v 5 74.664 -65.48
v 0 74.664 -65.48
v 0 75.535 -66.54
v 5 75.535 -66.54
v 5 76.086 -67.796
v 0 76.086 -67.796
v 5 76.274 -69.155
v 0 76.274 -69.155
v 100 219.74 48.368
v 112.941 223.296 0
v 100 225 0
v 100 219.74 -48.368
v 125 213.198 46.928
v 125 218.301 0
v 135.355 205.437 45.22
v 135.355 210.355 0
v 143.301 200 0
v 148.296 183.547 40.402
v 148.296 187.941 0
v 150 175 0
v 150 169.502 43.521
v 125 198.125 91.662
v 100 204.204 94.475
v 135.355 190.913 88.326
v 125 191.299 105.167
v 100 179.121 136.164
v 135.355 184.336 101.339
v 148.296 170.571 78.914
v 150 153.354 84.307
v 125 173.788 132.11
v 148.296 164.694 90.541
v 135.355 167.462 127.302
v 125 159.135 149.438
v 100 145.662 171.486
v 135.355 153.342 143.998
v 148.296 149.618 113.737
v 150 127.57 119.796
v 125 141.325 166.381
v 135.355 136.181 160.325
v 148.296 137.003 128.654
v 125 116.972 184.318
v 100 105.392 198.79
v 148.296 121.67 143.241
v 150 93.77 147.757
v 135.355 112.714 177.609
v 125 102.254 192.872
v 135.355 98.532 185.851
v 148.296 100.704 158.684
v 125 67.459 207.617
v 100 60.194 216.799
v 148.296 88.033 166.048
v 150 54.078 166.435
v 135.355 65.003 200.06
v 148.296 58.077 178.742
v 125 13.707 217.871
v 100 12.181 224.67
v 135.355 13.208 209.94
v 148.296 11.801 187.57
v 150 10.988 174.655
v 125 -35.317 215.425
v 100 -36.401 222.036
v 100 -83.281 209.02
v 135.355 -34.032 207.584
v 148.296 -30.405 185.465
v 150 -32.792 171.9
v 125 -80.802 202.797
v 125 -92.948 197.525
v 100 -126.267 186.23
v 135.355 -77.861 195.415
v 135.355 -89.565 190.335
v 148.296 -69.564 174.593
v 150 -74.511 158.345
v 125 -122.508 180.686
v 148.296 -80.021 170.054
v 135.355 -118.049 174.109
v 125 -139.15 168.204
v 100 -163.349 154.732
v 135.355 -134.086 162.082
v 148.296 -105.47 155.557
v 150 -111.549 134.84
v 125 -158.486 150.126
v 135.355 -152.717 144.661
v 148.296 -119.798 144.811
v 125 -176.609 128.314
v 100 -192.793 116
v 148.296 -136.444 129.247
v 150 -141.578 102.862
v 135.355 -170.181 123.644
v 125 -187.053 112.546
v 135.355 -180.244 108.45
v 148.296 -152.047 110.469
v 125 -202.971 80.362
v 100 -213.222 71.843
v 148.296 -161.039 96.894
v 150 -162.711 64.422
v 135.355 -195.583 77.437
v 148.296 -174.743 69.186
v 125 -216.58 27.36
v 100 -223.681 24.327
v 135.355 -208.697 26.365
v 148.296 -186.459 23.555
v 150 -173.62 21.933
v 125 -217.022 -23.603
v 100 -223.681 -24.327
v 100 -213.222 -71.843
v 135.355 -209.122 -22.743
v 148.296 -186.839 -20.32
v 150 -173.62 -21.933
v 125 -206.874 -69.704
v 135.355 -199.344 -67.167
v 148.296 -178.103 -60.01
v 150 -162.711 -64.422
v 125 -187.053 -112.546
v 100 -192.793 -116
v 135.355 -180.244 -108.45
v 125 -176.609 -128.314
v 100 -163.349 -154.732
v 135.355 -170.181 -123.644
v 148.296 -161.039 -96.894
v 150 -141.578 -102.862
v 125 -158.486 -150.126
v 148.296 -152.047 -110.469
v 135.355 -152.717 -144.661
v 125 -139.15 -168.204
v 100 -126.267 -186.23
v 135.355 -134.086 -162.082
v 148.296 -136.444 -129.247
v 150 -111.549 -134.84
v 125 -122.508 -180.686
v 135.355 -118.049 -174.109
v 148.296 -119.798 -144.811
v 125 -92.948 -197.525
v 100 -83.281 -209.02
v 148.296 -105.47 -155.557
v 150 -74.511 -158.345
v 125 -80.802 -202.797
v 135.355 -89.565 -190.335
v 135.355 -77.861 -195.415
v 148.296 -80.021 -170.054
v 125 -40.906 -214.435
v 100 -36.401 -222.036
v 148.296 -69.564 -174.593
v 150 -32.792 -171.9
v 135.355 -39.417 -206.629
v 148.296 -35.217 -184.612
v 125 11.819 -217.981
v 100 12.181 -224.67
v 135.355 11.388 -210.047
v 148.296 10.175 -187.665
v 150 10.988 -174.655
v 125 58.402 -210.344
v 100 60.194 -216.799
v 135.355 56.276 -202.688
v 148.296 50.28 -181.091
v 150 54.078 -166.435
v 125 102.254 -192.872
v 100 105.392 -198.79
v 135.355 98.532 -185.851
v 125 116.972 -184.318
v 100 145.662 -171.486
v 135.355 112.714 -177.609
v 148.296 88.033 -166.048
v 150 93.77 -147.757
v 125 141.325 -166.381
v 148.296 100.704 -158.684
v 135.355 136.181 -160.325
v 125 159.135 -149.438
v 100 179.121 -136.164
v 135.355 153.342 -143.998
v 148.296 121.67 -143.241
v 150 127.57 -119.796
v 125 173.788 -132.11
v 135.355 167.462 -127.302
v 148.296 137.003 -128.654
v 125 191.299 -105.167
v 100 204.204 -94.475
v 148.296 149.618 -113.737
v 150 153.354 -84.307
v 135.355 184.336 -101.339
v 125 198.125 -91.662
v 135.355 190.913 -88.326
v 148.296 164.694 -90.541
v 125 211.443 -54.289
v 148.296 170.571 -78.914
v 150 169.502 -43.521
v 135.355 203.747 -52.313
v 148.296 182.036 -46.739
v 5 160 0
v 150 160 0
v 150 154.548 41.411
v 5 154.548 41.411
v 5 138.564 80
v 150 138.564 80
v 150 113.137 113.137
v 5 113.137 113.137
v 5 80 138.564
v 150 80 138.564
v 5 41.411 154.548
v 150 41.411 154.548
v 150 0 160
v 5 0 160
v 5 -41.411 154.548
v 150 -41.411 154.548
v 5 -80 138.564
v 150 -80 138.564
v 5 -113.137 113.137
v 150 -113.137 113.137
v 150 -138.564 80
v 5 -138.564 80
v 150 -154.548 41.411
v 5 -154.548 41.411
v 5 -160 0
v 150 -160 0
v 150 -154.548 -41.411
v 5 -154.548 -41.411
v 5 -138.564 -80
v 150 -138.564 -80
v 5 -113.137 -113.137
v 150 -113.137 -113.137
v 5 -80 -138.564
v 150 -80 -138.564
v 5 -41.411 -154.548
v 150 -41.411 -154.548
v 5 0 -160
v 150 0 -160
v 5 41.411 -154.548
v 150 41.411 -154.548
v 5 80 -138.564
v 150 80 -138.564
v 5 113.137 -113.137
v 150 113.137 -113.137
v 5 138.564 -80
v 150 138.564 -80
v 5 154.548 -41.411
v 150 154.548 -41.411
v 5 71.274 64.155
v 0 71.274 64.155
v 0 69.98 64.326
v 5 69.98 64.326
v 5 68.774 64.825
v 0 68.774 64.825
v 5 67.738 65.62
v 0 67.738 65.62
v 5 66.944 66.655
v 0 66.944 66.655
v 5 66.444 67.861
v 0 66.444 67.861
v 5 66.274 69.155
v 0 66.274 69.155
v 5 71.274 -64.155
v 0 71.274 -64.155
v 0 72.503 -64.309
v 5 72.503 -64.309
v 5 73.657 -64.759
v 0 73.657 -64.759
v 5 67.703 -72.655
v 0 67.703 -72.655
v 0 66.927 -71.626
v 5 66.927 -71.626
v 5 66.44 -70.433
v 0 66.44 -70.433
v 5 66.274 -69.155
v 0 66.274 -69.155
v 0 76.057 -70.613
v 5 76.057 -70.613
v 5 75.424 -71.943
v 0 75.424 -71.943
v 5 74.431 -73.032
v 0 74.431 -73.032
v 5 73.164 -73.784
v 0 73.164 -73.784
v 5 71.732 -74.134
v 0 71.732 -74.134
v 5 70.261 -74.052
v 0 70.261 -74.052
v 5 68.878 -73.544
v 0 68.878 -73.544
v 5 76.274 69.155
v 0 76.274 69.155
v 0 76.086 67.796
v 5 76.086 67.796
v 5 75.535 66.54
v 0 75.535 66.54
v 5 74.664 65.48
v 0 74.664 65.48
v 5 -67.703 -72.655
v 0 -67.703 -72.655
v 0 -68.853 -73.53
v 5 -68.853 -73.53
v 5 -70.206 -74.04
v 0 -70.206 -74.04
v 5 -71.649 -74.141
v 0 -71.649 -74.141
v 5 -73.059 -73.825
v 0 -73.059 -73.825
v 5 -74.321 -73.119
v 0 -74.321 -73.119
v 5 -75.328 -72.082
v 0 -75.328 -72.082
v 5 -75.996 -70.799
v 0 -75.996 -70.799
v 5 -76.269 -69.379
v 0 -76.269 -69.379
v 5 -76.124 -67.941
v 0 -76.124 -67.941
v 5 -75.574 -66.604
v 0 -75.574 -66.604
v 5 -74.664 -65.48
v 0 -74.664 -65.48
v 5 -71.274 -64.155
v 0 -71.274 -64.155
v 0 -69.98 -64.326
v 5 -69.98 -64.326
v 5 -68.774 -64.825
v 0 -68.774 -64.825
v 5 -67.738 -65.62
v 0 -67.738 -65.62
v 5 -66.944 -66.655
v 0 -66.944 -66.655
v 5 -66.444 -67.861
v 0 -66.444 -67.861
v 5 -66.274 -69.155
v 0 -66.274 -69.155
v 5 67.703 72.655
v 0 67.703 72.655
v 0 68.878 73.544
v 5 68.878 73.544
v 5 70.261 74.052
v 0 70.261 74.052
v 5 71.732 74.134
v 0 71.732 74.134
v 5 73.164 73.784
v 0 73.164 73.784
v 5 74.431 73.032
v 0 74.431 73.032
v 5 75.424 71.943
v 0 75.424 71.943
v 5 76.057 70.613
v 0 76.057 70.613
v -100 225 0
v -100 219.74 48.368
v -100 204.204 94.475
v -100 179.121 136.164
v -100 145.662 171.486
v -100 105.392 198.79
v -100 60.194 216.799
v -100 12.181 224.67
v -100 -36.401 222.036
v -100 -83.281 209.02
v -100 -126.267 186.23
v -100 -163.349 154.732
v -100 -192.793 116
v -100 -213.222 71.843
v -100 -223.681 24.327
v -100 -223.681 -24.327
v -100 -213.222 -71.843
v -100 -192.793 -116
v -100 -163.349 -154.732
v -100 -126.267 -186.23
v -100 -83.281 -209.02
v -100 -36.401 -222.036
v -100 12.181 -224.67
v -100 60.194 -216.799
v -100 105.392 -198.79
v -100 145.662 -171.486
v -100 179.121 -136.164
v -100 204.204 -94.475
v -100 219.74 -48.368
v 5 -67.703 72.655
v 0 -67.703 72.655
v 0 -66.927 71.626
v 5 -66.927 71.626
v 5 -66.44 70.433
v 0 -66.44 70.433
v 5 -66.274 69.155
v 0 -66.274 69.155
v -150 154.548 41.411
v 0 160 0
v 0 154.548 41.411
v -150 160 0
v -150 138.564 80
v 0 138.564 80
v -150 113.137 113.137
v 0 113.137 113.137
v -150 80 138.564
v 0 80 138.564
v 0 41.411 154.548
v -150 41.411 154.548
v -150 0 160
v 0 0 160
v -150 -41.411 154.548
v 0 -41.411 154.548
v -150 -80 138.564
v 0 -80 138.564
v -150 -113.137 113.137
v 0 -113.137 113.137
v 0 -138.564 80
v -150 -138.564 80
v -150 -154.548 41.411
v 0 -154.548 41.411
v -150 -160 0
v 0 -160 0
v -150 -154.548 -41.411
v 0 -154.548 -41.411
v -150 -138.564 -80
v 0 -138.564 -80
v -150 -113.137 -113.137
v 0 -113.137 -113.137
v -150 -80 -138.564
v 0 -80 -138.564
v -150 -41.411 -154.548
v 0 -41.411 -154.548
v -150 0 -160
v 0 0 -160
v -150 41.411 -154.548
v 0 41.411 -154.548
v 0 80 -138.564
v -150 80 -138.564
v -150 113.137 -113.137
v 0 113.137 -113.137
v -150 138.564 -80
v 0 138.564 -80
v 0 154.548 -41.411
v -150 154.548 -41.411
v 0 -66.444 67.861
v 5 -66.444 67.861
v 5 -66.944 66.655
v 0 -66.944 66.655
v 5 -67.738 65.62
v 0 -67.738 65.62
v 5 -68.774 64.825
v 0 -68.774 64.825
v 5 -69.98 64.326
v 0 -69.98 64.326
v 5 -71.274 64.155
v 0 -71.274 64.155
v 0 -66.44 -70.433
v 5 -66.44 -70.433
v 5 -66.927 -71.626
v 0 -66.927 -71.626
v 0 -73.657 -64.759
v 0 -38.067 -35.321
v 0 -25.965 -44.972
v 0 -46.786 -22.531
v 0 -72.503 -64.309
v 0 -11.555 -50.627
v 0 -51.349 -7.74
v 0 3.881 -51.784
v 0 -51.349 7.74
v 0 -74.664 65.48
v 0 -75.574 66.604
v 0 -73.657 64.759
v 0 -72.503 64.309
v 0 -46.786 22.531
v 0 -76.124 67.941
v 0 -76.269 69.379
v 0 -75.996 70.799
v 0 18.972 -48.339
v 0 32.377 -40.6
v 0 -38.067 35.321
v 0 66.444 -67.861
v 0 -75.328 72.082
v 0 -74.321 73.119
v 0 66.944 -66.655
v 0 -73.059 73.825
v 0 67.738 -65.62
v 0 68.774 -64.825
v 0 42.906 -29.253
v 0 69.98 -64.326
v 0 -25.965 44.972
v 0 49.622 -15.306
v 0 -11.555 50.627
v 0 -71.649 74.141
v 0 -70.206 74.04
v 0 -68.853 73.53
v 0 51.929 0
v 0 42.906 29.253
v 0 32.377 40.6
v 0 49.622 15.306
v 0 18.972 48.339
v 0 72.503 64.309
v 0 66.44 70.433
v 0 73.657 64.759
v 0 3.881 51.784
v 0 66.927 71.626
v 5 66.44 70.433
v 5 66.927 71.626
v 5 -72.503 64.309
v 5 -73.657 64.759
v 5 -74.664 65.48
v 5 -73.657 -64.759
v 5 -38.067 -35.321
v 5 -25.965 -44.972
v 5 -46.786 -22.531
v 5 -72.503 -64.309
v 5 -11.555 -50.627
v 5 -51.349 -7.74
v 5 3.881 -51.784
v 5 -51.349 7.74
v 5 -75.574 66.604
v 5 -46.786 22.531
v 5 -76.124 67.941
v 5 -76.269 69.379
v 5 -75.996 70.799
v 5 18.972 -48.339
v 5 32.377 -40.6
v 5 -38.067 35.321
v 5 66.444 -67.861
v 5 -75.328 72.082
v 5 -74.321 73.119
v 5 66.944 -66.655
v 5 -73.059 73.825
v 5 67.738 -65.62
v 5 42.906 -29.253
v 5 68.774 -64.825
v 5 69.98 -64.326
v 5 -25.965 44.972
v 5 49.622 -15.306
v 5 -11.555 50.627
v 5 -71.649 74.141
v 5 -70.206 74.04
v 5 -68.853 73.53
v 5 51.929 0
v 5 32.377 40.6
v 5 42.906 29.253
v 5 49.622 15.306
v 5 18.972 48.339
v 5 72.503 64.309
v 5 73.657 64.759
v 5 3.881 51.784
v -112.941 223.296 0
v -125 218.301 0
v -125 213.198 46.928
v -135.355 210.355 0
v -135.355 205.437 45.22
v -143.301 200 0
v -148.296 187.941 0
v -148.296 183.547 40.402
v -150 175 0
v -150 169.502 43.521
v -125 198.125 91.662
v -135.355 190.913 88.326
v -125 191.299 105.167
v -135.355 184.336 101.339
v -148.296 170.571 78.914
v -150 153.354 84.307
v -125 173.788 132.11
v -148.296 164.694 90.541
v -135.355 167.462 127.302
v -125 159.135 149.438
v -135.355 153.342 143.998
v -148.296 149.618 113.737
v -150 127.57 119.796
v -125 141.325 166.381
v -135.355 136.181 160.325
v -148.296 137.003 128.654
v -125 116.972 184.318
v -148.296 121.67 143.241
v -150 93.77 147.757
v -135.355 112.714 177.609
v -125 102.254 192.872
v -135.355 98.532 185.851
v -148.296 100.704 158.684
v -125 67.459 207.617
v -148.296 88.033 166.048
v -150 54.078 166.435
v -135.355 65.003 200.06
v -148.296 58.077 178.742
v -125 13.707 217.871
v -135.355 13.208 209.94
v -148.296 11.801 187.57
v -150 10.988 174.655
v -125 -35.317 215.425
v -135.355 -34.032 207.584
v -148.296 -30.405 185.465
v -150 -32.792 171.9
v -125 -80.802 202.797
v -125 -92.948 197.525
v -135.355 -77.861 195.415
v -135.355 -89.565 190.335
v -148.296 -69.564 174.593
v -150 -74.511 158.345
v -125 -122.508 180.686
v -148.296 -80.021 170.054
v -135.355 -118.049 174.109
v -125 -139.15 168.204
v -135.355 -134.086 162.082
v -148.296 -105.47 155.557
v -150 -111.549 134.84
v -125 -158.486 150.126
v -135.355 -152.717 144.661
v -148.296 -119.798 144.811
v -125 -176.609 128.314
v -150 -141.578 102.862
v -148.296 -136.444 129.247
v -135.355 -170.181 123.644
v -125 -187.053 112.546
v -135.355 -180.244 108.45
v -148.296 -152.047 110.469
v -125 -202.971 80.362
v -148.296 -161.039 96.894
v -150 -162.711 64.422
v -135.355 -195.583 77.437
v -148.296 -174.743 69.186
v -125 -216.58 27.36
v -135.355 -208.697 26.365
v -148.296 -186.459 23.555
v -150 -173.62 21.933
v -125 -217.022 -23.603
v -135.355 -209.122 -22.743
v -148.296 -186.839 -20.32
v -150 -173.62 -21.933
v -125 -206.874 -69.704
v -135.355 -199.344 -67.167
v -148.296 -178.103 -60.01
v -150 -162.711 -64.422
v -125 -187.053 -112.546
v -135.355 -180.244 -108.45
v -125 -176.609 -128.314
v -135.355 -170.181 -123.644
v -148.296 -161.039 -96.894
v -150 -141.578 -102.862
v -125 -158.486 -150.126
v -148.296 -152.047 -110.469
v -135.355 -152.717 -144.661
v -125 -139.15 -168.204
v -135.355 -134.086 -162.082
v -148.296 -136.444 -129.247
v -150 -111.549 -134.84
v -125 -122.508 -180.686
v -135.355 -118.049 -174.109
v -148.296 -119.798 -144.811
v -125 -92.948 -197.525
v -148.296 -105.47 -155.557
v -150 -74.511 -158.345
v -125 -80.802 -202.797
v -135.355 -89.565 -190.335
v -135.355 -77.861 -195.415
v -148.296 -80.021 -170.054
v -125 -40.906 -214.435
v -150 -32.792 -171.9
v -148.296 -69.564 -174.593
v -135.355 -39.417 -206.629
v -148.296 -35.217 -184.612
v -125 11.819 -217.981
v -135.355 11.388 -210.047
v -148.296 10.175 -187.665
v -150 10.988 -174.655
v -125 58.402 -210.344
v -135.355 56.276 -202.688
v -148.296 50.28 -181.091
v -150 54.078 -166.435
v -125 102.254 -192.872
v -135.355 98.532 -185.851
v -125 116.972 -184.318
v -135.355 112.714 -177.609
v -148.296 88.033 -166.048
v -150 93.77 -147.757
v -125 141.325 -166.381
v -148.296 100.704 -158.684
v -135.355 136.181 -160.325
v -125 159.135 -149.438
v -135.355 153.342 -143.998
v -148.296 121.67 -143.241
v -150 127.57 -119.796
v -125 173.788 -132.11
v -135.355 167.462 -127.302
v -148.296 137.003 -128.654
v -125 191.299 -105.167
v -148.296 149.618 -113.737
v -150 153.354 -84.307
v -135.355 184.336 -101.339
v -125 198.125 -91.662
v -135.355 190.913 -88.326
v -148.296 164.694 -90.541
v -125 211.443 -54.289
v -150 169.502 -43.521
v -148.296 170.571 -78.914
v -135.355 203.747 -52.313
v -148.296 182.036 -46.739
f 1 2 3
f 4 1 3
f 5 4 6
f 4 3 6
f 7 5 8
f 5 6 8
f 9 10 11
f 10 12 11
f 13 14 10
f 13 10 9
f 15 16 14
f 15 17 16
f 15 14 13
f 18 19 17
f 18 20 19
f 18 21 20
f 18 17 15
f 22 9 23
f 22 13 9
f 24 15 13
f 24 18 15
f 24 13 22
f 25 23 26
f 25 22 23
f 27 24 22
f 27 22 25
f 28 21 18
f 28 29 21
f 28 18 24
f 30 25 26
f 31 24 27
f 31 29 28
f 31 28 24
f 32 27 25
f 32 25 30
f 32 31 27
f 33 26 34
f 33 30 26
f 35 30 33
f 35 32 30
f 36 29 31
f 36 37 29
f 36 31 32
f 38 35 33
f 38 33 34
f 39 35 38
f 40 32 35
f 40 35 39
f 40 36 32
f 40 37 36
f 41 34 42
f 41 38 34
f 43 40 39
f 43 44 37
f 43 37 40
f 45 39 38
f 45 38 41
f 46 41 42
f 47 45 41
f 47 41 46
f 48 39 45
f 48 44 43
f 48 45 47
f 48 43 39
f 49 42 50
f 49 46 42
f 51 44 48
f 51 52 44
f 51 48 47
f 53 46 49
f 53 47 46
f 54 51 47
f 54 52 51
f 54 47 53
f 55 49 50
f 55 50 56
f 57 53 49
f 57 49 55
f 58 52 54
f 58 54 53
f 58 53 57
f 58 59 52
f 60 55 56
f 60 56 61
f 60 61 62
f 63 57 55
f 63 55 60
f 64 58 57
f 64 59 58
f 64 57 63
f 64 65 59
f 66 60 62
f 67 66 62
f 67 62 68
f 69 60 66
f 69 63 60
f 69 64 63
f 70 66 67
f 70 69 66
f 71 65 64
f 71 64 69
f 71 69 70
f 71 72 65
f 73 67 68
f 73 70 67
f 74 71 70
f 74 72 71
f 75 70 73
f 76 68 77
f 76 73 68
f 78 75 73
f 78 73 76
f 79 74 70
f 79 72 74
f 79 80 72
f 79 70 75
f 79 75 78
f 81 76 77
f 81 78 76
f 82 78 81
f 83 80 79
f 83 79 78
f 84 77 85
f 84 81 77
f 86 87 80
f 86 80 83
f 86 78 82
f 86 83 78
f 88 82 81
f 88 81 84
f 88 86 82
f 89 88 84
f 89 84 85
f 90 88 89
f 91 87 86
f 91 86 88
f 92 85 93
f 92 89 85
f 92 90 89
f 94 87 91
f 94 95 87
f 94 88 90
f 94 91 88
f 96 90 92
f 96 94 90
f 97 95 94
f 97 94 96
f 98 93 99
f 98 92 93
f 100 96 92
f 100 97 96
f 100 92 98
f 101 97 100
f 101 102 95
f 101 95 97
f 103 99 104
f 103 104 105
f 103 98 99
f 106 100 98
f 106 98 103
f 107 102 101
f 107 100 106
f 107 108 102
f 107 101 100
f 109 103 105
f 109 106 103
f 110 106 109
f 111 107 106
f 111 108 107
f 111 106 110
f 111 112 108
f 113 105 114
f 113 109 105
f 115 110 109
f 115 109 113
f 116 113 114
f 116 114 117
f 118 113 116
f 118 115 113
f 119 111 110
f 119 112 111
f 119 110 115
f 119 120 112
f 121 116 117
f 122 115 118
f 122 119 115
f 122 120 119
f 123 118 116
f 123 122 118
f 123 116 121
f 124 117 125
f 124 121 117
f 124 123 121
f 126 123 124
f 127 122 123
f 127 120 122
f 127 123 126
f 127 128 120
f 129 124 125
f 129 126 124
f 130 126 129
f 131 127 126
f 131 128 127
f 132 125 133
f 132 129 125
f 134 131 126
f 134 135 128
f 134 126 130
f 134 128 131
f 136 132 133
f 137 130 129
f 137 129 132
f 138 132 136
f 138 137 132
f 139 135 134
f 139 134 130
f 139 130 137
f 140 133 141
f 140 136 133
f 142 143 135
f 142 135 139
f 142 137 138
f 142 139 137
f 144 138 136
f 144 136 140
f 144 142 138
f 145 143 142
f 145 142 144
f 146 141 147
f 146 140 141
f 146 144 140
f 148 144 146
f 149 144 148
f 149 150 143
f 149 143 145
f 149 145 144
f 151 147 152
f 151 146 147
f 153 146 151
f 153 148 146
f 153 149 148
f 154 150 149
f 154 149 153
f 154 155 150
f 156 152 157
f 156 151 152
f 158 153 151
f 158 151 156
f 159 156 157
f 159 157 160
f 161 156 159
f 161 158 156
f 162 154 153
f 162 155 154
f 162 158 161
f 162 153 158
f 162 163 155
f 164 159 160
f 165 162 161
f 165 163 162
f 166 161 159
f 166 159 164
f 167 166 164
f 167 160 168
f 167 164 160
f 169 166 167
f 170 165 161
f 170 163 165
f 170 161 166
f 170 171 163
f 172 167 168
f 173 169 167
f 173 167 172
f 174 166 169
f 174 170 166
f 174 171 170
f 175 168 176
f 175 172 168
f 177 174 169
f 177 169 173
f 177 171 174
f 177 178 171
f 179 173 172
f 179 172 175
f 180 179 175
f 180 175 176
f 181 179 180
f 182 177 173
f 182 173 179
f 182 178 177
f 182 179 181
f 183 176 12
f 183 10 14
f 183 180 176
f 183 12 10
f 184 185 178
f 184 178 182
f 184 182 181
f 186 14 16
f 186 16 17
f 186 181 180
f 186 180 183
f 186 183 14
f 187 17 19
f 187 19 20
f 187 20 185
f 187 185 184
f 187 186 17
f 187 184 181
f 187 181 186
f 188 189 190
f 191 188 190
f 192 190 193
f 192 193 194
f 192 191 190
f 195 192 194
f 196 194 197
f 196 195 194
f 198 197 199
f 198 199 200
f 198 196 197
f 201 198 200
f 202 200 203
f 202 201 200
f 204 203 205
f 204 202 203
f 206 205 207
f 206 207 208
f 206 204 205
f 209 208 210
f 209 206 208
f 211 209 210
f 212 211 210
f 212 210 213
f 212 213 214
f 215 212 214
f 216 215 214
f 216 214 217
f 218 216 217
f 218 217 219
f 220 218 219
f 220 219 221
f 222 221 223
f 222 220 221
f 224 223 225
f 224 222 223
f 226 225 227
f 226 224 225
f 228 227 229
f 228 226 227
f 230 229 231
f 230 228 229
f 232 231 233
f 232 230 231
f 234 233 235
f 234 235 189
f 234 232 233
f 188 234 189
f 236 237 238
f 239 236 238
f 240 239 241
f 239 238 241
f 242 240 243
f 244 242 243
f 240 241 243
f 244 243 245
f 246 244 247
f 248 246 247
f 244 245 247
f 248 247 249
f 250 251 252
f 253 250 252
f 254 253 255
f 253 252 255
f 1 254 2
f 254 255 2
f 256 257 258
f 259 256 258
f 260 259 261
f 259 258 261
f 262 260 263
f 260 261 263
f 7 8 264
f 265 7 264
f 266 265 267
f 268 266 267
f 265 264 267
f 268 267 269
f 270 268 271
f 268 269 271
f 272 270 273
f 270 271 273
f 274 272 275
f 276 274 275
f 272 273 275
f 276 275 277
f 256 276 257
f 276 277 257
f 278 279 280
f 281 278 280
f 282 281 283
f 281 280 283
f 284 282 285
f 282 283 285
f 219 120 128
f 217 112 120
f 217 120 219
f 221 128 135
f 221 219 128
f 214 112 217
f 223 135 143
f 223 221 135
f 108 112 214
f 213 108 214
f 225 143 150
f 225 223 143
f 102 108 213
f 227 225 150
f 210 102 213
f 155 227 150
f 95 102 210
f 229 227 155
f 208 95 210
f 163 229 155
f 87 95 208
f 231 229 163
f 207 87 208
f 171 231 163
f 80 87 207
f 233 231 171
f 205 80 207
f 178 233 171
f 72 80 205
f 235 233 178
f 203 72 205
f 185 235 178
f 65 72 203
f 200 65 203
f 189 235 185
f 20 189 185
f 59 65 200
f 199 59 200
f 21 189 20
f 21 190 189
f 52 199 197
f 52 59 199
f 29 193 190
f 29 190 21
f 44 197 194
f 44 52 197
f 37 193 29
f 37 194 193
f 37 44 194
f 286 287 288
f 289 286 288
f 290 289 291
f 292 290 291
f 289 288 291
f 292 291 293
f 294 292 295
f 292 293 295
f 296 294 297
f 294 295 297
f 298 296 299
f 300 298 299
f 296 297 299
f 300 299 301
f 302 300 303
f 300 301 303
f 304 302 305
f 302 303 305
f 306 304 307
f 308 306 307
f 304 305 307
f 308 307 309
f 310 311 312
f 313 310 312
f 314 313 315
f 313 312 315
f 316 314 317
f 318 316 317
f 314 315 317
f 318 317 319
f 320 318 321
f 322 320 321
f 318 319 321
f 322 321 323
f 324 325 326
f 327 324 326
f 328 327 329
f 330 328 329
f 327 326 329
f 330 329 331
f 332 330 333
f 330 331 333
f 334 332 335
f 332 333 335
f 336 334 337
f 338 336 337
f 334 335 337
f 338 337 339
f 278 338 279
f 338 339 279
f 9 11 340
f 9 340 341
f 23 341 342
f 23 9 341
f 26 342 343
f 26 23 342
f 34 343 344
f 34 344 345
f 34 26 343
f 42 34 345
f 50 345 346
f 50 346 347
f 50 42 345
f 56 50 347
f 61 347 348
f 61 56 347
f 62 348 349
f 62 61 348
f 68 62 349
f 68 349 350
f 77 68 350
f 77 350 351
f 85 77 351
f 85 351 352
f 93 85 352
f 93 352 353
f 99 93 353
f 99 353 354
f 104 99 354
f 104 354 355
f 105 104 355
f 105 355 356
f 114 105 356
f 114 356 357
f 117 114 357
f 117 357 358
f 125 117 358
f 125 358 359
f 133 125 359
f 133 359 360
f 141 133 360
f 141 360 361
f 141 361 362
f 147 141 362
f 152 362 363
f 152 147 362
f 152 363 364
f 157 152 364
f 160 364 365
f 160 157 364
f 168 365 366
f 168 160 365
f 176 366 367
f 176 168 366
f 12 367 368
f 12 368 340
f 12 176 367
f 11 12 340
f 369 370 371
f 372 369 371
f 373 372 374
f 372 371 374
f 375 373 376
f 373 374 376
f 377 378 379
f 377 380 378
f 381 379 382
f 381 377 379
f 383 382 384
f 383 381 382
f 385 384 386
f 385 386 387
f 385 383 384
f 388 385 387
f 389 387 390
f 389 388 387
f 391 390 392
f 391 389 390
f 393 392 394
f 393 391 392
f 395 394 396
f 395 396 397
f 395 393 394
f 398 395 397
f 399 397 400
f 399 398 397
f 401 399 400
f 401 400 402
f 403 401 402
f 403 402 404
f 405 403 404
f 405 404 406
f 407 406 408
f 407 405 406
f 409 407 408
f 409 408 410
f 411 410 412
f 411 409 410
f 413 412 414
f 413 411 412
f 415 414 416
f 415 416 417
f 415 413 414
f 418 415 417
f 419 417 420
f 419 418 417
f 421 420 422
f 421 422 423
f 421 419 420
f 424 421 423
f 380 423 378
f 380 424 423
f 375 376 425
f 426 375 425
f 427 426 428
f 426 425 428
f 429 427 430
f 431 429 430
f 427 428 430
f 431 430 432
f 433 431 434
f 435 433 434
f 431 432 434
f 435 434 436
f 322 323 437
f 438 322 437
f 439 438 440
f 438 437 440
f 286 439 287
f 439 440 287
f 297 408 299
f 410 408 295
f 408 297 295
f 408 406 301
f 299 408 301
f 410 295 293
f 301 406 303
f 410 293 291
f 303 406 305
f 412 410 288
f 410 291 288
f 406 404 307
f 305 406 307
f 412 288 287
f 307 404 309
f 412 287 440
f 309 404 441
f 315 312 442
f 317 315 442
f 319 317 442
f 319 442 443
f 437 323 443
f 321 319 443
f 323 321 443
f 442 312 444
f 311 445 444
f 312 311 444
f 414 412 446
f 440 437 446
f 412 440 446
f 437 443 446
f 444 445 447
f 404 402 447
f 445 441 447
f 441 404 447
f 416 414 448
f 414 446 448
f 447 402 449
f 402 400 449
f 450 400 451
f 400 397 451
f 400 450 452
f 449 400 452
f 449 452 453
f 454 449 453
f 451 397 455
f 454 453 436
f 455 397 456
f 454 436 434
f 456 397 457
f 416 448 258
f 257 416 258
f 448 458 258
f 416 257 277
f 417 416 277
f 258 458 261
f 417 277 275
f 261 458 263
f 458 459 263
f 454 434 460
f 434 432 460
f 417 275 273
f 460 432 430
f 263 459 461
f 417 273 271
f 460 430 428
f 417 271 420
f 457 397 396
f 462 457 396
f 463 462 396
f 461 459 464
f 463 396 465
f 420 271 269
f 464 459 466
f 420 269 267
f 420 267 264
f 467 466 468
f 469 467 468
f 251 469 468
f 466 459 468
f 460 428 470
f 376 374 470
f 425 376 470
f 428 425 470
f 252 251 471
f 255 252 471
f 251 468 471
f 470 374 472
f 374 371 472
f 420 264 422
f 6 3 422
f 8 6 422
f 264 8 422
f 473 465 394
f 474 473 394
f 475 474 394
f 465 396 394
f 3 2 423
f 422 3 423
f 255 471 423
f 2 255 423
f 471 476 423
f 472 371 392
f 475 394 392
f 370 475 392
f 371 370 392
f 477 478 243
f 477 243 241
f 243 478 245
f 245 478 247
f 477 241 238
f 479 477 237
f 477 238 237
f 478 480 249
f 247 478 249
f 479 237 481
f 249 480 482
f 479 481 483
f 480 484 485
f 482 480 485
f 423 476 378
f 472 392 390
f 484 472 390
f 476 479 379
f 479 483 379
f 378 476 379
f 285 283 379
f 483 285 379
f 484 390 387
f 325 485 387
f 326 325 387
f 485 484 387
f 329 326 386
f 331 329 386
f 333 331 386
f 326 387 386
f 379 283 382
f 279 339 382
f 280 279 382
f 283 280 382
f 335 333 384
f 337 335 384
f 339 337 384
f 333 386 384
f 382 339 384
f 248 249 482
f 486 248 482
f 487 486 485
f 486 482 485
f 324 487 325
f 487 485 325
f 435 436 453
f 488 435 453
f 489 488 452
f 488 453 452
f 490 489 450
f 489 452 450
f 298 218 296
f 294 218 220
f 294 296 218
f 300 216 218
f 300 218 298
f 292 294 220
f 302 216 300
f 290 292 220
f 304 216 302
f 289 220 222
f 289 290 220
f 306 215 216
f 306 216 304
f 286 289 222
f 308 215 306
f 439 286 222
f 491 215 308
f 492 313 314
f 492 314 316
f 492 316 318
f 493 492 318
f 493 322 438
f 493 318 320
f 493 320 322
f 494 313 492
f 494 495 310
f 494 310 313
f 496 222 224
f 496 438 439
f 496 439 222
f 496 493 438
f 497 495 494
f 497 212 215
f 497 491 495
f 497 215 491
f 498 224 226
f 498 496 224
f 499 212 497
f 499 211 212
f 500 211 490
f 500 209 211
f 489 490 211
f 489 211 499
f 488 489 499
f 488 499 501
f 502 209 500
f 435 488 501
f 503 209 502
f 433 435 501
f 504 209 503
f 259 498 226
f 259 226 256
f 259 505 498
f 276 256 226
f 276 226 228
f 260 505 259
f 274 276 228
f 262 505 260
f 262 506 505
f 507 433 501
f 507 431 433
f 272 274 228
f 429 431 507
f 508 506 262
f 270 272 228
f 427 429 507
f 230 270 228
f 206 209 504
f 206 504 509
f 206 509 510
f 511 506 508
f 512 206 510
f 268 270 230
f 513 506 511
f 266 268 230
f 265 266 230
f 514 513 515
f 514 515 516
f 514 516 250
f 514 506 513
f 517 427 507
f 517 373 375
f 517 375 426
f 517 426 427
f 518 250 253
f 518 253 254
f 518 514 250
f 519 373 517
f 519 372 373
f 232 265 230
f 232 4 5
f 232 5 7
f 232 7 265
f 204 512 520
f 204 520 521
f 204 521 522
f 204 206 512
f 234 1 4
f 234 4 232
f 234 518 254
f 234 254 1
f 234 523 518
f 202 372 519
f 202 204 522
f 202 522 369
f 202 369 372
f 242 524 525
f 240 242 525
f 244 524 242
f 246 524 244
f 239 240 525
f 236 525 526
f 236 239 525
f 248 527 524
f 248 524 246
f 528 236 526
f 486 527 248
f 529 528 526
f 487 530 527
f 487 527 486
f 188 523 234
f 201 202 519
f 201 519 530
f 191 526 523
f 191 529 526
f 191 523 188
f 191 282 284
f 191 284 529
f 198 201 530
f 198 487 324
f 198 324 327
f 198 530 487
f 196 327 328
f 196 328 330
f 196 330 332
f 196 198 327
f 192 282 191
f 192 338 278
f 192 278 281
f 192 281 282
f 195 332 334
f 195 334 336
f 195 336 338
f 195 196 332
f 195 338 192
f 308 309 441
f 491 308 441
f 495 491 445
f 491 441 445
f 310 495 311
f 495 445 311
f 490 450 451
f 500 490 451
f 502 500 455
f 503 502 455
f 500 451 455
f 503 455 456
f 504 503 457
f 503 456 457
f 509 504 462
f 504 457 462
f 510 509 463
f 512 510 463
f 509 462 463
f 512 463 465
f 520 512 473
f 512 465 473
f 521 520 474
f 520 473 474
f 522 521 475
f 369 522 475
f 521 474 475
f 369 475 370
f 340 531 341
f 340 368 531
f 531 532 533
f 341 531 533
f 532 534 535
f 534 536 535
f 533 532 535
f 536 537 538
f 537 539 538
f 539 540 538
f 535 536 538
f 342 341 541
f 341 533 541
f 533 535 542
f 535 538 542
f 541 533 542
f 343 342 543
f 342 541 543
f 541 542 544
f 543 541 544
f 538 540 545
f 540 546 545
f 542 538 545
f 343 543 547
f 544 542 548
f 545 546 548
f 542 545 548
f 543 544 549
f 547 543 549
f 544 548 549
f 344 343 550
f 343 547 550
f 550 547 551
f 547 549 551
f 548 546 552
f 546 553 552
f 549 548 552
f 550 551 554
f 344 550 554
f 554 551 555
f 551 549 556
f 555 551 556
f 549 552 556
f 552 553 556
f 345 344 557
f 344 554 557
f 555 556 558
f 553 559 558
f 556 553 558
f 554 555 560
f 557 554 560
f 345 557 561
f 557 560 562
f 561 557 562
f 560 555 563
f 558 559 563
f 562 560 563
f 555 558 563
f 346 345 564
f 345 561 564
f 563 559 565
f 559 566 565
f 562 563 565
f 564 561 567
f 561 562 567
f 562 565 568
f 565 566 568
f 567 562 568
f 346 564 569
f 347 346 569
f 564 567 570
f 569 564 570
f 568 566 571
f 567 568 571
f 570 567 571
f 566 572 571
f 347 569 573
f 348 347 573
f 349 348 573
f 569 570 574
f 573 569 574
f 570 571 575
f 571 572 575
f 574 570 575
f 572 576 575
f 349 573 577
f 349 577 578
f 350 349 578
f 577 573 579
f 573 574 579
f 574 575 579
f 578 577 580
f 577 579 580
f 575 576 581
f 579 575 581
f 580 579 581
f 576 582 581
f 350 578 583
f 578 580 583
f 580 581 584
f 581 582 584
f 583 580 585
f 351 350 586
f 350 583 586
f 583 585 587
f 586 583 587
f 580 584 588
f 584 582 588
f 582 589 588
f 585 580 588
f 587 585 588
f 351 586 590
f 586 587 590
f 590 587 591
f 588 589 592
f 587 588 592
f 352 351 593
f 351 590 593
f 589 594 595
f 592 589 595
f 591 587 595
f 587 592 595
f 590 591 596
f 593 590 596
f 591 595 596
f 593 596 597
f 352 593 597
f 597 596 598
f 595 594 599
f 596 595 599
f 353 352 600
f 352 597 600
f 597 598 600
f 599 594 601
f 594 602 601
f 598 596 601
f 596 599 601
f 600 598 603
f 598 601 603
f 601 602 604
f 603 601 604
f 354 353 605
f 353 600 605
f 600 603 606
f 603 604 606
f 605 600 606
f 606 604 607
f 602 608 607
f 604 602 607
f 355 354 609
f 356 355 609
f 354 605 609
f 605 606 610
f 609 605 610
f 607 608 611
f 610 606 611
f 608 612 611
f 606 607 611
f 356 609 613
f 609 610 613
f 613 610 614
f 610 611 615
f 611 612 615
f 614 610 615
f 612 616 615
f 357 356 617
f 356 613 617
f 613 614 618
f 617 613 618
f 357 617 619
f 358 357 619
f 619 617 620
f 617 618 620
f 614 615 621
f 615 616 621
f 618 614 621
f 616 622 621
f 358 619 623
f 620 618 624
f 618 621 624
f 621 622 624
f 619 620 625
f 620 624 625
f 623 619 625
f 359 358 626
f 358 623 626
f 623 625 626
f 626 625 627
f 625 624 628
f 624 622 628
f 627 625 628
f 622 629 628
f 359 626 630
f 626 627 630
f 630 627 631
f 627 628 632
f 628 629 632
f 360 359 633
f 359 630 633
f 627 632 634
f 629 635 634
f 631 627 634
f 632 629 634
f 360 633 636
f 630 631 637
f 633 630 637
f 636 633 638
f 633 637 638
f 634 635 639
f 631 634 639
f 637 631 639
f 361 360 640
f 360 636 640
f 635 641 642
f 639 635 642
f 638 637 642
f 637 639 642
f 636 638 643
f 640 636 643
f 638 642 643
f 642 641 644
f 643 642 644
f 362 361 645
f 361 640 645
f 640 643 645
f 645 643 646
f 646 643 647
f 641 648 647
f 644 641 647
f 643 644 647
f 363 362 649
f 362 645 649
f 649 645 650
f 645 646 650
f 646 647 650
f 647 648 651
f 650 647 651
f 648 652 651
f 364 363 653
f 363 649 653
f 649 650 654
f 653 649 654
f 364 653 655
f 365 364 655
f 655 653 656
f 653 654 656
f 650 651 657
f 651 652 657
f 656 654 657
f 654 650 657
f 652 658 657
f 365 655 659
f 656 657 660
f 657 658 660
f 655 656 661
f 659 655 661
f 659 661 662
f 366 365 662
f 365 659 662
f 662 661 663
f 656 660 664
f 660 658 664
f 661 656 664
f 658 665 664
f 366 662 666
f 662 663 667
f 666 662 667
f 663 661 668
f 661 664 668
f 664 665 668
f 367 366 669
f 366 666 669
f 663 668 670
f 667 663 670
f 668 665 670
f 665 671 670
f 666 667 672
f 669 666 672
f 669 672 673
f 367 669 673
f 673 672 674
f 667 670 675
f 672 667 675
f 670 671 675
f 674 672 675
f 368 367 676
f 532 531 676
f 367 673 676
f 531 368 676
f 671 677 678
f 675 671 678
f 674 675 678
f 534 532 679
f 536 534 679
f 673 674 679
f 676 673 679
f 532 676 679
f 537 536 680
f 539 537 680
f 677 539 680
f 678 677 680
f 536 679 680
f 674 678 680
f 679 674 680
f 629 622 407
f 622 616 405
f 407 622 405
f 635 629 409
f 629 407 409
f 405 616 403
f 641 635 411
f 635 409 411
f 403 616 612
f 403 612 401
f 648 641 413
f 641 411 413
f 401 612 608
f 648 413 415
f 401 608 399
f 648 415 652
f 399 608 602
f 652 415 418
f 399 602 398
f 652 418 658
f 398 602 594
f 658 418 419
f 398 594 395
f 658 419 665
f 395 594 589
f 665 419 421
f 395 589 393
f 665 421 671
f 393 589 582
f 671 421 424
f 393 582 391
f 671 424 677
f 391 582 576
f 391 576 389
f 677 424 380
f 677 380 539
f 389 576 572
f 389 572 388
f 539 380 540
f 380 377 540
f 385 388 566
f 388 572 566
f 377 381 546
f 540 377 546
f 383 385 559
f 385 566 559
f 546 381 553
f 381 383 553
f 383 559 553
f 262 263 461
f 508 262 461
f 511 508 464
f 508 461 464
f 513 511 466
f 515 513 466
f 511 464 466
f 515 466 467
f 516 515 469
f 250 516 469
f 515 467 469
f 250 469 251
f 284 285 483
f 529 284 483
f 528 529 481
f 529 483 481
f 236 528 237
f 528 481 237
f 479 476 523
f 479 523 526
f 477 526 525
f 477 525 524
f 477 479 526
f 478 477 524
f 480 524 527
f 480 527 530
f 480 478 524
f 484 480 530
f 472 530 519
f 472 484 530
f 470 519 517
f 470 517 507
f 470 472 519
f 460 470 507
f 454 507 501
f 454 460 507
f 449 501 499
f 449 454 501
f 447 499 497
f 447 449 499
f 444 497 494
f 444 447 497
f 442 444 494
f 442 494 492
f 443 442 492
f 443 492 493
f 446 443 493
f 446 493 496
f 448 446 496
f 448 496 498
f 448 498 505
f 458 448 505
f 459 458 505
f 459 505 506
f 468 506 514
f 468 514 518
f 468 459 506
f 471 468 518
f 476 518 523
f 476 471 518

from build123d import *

# Parameters (mm, degrees)
F0_R     = 225
F0_R_2   = 160
F1_DEPTH = 150
F2_R     = 50
F0_R_3   = 51.929068635
F3_DEPTH = 5


with BuildPart() as f1:
    # F0 (on Right) → F1 (new body, symmetric)
    with BuildSketch(Plane.YZ):
        Circle(F0_R)
        Circle(F0_R_2, mode=Mode.SUBTRACT)
    extrude(amount=F1_DEPTH, both=True)

    # F2
    f2_edges = [f1.edges().sort_by_distance(p)[0] for p in [
        (150, -225, 0),
        (-150, -225, 0),
        (0, 225, 0),
    ]]
    fillet(f2_edges, radius=F2_R)

    # F0 (on Right) → F3 (join)
    with BuildSketch(Plane.YZ):
        Circle(F0_R_2)
        with BuildLine():
            ThreePointArc((74.6640796825, 65.4801758986), (92.944153106, 34.982318876), (99.3095072515, 0))
            ThreePointArc((99.3095072515, 0), (92.944153106, -34.982318876), (74.6640796825, -65.4801758986))
            ThreePointArc((74.6640796825, -65.4801758986), (75.8536647795, -67.1491372402), (76.2737192458, -69.1551529202))
            ThreePointArc((76.2737192458, -69.1551529202), (73.1638044573, -73.7841461037), (67.7026880885, -72.6548295444))
            ThreePointArc((67.7026880885, -72.6548295444), (0, -99.3095072515), (-67.7026880885, -72.6548295444))
            ThreePointArc((-67.7026880885, -72.6548295444), (-74.8621832921, -72.6369521373), (-74.6640796825, -65.4801758986))
            ThreePointArc((-74.6640796825, -65.4801758986), (-99.3095072515, 0), (-74.6640796825, 65.4801758986))
            ThreePointArc((-74.6640796825, 65.4801758986), (-74.8621832921, 72.6369521373), (-67.7026880885, 72.6548295444))
            ThreePointArc((-67.7026880885, 72.6548295444), (0, 99.3095072515), (67.7026880885, 72.6548295444))
            ThreePointArc((67.7026880885, 72.6548295444), (73.1638044573, 73.7841461037), (76.2737192458, 69.1551529202))
            ThreePointArc((76.2737192458, 69.1551529202), (75.8536647795, 67.1491372402), (74.6640796825, 65.4801758986))
        make_face(mode=Mode.SUBTRACT)
        with BuildLine():
            ThreePointArc((-71.2737192458, 64.1551529202), (-73.0937624997, 64.4981750853), (-74.6640796825, 65.4801758986))
            ThreePointArc((-74.6640796825, 65.4801758986), (-99.3095072515, 0), (-74.6640796825, -65.4801758986))
            ThreePointArc((-74.6640796825, -65.4801758986), (-73.0937624997, -64.4981750853), (-71.2737192458, -64.1551529202))
            Line((-71.2737192458, -64.1551529202), (-71.2737192458, 64.1551529202))
        make_face()
        with BuildLine():
            ThreePointArc((66.2737192458, 69.1551529202), (66.6447260623, 71.0452381317), (67.7026880885, 72.6548295444))
            ThreePointArc((67.7026880885, 72.6548295444), (0, 99.3095072515), (-67.7026880885, 72.6548295444))
            ThreePointArc((-67.7026880885, 72.6548295444), (-66.6447260623, 71.0452381317), (-66.2737192458, 69.1551529202))
            Line((-66.2737192458, 69.1551529202), (66.2737192458, 69.1551529202))
        make_face()
        with BuildLine():
            ThreePointArc((-67.7026880885, -72.6548295444), (0, -99.3095072515), (67.7026880885, -72.6548295444))
            ThreePointArc((67.7026880885, -72.6548295444), (66.6447260623, -71.0452381317), (66.2737192458, -69.1551529202))
            Line((66.2737192458, -69.1551529202), (-66.2737192458, -69.1551529202))
            ThreePointArc((-66.2737192458, -69.1551529202), (-66.6447260623, -71.0452381317), (-67.7026880885, -72.6548295444))
        make_face()
        with BuildLine():
            Line((71.2737192458, -64.1551529202), (71.2737192458, 64.1551529202))
            ThreePointArc((71.2737192458, 64.1551529202), (67.7381853399, 65.6196190142), (66.2737192458, 69.1551529202))
            Line((66.2737192458, 69.1551529202), (-66.2737192458, 69.1551529202))
            ThreePointArc((-66.2737192458, 69.1551529202), (-67.7381853399, 65.6196190142), (-71.2737192458, 64.1551529202))
            Line((-71.2737192458, 64.1551529202), (-71.2737192458, -64.1551529202))
            ThreePointArc((-71.2737192458, -64.1551529202), (-67.7381853399, -65.6196190142), (-66.2737192458, -69.1551529202))
            Line((-66.2737192458, -69.1551529202), (66.2737192458, -69.1551529202))
            ThreePointArc((66.2737192458, -69.1551529202), (67.7381853399, -65.6196190142), (71.2737192458, -64.1551529202))
        make_face()
        Circle(F0_R_3, mode=Mode.SUBTRACT)
        with BuildLine():
            ThreePointArc((74.6640796825, -65.4801758986), (92.944153106, -34.982318876), (99.3095072515, 0))
            ThreePointArc((99.3095072515, 0), (92.944153106, 34.982318876), (74.6640796825, 65.4801758986))
            ThreePointArc((74.6640796825, 65.4801758986), (73.0937624997, 64.4981750853), (71.2737192458, 64.1551529202))
            Line((71.2737192458, 64.1551529202), (71.2737192458, -64.1551529202))
            ThreePointArc((71.2737192458, -64.1551529202), (73.0937624997, -64.4981750853), (74.6640796825, -65.4801758986))
        make_face()
    extrude(amount=F3_DEPTH)


solid = f1.part
